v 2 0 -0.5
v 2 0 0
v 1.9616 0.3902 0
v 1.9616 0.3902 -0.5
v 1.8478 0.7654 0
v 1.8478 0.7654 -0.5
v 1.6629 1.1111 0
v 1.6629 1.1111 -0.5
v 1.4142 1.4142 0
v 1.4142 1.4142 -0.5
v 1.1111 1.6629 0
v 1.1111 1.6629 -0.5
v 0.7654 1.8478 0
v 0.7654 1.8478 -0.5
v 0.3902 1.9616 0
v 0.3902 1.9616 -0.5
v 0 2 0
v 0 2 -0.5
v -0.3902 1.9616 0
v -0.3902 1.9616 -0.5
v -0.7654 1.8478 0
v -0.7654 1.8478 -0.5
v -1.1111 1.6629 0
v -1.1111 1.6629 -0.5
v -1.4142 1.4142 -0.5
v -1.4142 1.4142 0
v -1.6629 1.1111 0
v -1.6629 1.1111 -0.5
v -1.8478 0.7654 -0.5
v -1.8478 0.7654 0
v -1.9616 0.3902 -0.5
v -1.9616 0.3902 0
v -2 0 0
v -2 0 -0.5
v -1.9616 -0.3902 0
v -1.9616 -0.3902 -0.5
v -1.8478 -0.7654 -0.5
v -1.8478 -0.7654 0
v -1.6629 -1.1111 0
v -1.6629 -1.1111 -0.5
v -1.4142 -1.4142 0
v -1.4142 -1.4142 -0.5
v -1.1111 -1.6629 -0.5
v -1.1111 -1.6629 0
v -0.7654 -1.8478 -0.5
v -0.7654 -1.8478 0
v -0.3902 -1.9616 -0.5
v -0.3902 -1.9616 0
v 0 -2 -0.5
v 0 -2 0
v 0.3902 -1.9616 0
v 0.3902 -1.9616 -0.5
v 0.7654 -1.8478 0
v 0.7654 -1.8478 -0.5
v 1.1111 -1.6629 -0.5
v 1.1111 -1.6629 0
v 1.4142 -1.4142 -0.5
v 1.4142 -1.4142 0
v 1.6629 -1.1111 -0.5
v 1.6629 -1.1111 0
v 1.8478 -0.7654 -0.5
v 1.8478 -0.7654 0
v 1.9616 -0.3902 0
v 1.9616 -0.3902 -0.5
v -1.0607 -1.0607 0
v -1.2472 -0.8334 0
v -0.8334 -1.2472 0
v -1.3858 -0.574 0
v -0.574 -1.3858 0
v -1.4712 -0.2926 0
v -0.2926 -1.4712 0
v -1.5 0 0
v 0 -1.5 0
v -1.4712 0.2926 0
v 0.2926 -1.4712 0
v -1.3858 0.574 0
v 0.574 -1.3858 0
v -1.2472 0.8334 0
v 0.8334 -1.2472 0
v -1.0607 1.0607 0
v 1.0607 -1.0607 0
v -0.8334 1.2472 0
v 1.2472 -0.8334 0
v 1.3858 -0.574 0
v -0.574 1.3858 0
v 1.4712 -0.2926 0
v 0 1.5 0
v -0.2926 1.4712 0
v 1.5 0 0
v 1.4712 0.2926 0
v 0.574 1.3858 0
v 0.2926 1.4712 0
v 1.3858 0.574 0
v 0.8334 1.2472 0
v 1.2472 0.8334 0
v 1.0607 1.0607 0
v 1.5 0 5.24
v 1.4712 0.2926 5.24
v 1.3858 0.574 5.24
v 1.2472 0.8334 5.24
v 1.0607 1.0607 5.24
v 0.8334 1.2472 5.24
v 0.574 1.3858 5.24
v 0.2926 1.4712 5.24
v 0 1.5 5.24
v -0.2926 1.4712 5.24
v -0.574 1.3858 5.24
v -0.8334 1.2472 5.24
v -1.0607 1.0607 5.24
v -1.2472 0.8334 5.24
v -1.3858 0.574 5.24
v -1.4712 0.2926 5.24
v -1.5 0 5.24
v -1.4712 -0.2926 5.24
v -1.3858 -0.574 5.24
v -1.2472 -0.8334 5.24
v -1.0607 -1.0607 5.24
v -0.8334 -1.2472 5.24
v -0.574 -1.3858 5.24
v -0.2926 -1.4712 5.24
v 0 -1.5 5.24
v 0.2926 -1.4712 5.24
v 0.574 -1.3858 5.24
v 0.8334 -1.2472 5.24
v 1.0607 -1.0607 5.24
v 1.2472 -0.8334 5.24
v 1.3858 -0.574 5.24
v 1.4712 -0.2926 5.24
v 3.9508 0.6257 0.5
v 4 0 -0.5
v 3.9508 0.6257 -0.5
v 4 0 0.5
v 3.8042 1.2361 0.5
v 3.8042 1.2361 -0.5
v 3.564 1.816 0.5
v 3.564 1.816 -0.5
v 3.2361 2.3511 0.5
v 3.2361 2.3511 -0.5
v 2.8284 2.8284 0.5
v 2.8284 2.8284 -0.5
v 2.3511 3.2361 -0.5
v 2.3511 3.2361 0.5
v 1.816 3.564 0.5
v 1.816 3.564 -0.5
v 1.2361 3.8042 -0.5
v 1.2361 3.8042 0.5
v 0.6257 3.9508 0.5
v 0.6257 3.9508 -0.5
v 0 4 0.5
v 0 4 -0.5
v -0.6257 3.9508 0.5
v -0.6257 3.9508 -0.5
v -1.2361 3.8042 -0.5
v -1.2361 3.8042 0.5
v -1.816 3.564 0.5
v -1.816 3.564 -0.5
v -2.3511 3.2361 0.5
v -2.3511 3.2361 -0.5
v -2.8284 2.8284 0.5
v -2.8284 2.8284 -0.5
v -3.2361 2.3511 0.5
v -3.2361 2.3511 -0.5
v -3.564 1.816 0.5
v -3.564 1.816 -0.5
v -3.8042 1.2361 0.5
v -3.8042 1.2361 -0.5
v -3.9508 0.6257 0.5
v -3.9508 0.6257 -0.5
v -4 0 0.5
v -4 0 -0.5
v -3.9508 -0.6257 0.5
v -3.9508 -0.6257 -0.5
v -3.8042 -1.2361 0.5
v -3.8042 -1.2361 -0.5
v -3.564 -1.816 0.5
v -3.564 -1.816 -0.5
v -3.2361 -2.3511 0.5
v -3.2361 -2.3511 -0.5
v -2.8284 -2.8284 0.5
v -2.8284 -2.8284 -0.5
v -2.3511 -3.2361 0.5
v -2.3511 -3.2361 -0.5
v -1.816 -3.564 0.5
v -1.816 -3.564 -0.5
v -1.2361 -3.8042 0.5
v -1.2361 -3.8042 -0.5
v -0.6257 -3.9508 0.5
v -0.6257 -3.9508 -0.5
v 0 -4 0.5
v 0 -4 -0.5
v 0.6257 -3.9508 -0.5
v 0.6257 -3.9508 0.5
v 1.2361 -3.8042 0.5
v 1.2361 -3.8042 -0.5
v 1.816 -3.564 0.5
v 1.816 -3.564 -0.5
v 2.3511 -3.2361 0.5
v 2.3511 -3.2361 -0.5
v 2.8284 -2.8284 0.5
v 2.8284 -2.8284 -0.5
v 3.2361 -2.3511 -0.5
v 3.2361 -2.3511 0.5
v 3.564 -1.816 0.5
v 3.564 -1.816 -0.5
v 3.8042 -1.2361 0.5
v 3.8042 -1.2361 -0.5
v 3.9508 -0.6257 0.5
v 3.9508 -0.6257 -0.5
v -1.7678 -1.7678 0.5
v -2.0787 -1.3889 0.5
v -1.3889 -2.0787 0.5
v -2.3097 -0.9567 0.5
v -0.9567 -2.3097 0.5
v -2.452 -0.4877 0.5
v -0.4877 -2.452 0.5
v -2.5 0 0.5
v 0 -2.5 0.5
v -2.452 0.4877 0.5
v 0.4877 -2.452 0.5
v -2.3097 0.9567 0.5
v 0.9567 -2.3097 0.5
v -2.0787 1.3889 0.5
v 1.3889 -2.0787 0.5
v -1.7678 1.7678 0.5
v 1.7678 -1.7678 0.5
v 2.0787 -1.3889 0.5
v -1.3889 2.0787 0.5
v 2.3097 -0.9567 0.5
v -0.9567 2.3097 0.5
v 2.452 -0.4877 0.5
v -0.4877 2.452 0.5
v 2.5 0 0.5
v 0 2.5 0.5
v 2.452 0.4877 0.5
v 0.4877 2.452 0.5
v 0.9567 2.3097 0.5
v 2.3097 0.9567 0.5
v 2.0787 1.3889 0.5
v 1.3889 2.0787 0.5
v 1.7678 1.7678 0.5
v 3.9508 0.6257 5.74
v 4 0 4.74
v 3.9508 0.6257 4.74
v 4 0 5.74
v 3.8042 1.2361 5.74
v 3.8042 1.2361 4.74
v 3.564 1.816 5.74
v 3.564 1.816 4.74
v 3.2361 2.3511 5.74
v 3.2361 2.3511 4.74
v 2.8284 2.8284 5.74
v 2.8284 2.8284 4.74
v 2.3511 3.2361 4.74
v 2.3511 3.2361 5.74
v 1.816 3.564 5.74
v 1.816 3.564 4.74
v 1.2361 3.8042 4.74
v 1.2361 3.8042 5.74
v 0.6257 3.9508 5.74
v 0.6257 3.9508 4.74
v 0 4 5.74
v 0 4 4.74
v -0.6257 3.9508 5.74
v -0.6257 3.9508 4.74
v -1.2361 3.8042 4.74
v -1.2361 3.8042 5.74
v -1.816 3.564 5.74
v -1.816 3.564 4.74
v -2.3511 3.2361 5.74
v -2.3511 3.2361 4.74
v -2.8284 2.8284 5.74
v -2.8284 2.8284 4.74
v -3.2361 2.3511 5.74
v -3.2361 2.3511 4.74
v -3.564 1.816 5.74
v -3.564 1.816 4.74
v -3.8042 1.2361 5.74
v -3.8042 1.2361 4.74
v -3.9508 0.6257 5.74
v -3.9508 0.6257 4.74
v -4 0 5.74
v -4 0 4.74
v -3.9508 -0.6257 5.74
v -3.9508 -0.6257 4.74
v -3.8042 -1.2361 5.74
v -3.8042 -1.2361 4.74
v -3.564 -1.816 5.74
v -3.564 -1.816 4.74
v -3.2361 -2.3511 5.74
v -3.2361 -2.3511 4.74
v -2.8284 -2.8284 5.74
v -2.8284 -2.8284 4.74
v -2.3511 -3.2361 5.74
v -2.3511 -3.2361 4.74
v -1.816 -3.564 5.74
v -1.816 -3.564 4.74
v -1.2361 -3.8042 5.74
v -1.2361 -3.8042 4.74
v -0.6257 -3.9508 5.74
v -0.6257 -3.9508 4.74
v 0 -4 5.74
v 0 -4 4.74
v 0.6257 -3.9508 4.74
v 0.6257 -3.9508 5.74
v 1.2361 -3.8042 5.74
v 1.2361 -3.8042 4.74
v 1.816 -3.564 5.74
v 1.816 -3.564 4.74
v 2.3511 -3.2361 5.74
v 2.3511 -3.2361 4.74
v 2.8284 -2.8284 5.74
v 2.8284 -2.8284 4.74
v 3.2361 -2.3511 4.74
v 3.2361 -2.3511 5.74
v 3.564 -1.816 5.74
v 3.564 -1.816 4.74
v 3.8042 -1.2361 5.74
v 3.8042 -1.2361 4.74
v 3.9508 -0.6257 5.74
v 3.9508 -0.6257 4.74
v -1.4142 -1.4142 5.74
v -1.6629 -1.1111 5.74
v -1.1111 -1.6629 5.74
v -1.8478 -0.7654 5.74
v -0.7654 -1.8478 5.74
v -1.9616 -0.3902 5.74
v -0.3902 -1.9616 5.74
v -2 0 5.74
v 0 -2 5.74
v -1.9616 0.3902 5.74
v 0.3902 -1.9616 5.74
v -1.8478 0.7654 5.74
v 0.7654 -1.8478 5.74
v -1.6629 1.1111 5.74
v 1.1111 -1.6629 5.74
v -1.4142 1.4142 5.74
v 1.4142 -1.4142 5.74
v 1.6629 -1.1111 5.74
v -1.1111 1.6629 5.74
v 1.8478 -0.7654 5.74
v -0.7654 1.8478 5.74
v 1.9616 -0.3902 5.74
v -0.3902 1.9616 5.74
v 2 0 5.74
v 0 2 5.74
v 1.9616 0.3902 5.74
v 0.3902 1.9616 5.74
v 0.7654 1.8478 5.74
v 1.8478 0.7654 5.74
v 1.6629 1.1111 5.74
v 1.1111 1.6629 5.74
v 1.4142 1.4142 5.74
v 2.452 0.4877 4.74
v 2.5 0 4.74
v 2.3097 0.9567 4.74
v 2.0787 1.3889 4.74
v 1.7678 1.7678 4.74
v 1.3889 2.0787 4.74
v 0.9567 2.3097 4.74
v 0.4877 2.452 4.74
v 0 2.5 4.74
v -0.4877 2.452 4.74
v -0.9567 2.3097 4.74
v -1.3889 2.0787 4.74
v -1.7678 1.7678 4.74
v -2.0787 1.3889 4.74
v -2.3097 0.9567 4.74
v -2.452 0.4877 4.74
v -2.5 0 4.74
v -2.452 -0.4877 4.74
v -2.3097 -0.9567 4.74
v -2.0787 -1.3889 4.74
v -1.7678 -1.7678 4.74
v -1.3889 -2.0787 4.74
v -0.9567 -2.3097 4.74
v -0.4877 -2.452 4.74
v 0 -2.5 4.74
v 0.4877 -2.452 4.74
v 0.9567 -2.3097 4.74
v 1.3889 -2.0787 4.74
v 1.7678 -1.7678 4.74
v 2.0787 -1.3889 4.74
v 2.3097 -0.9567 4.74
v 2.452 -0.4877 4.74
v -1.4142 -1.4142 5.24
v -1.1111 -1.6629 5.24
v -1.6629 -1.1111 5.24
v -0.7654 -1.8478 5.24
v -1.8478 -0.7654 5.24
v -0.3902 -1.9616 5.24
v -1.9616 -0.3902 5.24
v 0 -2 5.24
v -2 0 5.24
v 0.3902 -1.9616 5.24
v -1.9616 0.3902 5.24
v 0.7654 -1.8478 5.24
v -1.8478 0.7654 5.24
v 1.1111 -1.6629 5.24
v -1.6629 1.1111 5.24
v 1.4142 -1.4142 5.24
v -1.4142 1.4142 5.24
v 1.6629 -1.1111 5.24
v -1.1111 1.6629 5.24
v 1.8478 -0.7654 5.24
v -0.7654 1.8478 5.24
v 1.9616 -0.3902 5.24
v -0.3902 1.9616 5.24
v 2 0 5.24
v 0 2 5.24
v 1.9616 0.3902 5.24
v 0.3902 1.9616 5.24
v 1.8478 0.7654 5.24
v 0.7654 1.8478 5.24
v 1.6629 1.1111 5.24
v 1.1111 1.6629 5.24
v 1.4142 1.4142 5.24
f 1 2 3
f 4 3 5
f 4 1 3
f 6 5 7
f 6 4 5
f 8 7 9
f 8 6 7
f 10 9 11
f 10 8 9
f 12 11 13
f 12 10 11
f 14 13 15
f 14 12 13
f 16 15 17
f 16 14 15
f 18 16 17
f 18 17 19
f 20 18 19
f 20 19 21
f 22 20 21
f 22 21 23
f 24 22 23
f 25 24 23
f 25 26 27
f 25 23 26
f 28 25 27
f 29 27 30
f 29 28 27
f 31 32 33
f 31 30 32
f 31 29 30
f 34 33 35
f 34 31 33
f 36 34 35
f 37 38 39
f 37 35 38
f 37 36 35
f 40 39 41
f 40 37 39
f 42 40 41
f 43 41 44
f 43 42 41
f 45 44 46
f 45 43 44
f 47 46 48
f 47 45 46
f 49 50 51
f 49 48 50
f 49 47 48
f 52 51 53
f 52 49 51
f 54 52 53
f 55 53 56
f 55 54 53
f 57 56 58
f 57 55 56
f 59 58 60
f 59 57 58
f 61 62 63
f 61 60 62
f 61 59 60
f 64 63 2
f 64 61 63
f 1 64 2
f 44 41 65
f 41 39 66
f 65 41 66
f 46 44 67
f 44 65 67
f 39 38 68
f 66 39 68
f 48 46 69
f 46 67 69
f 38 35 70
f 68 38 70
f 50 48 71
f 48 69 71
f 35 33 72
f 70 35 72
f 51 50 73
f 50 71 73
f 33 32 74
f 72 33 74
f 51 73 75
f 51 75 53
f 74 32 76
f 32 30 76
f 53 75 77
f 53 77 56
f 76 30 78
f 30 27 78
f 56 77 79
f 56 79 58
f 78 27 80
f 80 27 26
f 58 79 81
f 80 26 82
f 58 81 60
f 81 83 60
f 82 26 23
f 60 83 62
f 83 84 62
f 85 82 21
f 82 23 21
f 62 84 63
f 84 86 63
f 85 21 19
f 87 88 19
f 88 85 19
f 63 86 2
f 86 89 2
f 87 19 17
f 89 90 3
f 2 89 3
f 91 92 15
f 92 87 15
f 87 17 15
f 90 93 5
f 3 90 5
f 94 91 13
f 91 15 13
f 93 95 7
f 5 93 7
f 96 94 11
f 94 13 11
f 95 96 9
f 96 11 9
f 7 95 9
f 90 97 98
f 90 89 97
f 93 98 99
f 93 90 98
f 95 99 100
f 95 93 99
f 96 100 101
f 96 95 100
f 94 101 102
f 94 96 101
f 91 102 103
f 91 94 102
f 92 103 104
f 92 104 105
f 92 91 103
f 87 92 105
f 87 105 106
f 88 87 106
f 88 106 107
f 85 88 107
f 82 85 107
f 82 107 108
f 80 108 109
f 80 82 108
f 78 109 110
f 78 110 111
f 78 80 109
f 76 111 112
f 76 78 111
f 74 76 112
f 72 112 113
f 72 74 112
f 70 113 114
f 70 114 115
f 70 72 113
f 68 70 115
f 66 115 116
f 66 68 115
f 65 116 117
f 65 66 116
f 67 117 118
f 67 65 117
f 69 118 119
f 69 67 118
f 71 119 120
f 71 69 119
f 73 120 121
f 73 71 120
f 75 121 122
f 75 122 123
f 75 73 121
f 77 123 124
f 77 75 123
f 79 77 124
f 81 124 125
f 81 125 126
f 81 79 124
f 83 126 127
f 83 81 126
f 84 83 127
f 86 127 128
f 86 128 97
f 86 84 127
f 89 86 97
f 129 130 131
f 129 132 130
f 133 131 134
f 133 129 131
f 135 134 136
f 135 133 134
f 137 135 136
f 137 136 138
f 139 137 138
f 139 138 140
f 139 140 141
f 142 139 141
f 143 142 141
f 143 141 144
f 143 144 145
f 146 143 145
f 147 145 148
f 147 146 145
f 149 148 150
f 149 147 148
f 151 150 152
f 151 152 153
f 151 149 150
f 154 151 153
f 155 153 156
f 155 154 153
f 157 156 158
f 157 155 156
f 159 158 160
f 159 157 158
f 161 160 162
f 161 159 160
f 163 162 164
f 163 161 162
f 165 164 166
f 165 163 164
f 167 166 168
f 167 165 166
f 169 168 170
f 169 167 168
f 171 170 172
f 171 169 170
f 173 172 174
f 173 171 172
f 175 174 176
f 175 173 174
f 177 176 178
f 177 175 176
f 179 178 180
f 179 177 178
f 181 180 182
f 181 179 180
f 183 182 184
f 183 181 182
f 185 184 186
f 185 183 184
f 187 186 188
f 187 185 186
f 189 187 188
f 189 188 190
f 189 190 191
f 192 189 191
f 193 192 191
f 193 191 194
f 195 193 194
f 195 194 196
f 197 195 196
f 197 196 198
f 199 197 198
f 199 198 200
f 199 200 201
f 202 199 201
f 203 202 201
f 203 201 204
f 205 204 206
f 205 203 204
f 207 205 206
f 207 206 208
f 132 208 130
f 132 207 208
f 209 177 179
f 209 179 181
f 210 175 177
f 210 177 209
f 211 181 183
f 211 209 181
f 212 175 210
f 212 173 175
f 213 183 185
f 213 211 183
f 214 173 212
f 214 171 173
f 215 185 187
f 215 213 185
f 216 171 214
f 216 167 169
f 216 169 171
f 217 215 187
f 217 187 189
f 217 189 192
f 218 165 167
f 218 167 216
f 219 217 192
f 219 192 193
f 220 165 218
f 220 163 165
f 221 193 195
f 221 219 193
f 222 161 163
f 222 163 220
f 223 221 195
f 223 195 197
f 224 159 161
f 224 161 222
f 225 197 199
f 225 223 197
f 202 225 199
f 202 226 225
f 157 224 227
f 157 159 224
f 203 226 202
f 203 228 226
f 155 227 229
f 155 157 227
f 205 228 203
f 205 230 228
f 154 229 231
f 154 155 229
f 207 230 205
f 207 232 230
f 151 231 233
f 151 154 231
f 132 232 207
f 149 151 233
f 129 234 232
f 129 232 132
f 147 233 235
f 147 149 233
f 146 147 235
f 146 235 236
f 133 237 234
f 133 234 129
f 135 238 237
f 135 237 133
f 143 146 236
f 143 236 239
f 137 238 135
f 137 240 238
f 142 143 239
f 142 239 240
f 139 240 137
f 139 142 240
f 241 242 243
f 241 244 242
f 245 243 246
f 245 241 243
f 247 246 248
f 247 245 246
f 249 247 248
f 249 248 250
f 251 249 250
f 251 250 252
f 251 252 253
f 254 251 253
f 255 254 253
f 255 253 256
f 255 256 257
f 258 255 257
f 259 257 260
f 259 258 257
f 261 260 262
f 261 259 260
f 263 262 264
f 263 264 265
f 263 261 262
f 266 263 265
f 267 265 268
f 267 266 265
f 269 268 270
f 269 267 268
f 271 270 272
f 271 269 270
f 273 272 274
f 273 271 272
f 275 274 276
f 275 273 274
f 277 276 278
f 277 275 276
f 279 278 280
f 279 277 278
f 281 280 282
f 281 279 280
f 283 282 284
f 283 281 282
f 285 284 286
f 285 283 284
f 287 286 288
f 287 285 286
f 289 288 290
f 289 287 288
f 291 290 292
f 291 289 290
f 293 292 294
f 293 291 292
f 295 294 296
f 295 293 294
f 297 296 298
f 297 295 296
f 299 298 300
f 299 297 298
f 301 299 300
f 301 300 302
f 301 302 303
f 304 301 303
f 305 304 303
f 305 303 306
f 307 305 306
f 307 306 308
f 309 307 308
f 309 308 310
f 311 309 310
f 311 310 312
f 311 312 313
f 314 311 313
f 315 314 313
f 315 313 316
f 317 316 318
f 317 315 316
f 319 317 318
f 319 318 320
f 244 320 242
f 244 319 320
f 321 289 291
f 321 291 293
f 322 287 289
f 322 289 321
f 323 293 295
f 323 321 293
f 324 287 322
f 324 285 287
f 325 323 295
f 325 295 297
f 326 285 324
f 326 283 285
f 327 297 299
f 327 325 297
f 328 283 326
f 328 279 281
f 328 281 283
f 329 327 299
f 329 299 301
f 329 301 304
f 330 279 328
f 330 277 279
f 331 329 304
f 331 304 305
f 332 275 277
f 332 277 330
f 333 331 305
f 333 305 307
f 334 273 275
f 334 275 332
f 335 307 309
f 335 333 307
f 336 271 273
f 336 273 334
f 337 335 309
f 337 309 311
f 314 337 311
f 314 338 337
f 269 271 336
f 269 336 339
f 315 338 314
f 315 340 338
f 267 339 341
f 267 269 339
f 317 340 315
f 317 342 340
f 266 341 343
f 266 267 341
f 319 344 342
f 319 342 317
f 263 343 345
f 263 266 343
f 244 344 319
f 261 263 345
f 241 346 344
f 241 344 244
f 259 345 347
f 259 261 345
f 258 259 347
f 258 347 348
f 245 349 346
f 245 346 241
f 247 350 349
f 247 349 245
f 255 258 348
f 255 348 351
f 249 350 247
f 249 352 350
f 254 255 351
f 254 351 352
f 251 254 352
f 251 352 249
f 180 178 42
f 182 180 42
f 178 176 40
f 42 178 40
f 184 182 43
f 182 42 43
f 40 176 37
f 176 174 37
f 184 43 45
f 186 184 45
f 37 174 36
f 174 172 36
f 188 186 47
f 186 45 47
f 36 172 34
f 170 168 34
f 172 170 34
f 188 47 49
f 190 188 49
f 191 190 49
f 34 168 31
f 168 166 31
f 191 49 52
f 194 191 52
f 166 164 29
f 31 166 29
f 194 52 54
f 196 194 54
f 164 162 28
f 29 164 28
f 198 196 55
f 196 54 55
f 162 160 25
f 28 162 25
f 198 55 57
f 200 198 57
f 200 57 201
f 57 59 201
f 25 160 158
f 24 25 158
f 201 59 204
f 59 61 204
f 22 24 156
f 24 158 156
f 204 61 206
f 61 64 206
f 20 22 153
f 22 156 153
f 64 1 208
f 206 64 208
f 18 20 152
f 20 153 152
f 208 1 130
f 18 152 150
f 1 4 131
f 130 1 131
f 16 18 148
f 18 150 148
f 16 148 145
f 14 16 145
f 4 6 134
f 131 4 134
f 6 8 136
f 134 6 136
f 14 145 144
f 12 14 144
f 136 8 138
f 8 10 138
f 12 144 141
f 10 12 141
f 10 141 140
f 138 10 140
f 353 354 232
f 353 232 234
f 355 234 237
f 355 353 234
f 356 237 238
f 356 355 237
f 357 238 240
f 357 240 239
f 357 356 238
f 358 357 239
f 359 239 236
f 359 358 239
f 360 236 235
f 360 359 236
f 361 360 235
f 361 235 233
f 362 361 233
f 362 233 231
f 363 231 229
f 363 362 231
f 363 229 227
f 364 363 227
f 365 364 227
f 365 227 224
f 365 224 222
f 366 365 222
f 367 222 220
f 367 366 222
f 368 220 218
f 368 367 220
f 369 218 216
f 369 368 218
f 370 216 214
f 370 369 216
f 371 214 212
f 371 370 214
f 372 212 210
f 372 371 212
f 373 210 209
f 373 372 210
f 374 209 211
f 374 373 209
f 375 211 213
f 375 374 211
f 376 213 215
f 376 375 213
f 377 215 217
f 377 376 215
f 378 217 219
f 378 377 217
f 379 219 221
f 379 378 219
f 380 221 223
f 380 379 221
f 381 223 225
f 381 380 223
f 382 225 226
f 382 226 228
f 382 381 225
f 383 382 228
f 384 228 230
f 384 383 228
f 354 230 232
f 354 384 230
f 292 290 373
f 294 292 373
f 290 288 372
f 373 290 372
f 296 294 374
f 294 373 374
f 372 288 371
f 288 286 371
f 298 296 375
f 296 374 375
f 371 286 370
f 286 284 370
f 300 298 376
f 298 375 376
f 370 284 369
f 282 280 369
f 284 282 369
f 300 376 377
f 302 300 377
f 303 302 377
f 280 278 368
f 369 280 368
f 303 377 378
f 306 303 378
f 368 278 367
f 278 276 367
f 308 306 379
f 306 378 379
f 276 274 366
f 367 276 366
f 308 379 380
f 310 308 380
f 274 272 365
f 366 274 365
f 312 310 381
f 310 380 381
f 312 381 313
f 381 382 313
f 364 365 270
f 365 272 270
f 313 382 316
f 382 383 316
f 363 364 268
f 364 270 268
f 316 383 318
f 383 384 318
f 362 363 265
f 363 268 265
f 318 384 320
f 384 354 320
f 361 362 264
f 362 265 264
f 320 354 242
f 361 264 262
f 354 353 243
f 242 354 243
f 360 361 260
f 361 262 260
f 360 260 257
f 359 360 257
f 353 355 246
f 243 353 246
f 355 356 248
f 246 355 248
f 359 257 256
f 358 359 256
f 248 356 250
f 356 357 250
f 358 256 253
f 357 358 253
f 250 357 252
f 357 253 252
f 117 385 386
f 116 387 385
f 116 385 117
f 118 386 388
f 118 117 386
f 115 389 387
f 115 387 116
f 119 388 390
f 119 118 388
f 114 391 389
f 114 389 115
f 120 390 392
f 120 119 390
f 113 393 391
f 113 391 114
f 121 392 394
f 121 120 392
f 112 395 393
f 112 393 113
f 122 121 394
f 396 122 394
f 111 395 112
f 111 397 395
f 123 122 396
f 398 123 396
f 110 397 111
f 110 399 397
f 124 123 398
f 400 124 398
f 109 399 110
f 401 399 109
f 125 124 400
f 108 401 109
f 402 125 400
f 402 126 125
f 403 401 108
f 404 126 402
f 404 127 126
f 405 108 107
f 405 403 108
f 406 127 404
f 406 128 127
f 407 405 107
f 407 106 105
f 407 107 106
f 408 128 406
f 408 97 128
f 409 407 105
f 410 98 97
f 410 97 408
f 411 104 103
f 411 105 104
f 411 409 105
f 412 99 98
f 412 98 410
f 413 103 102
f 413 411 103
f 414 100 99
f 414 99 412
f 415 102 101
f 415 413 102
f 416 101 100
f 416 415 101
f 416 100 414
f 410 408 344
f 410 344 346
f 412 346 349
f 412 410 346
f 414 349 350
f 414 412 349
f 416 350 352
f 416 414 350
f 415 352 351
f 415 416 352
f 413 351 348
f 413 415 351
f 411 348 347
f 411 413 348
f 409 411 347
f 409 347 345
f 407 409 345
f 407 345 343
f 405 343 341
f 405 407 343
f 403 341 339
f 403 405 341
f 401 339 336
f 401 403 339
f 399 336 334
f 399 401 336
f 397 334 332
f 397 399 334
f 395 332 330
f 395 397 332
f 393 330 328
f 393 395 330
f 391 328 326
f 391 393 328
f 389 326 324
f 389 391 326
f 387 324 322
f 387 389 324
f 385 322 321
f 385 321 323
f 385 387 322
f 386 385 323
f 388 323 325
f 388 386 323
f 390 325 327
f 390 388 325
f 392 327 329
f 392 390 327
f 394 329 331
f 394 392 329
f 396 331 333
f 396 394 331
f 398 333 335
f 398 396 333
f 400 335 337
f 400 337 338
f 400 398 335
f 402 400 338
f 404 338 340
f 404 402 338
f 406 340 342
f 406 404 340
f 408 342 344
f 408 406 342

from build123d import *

# Parameters (mm, degrees)
F0_R     = 4
F0_R_2   = 2
F5_DEPTH = 0.5
F2_R     = 2.5
F2_R_2   = 1.5
F6_DEPTH = 2.62
F4_R     = 4
F4_R_2   = 2
F7_DEPTH = 0.5


with BuildPart() as f5:
    # F0 (on Top) → F5 (new body, symmetric)
    with BuildSketch(Plane.XY):
        Circle(F0_R)
        Circle(F0_R_2, mode=Mode.SUBTRACT)
    extrude(amount=F5_DEPTH, both=True)

    # F2 (on offset) → F6 (join, symmetric)
    with BuildSketch(Plane.XY.offset(2.62)):
        Circle(F2_R)
        Circle(F2_R_2, mode=Mode.SUBTRACT)
    extrude(amount=F6_DEPTH, both=True)

    # F4 (on offset) → F7 (join, symmetric)
    with BuildSketch(Plane.XY.offset(5.24)):
        Circle(F4_R)
        Circle(F4_R_2, mode=Mode.SUBTRACT)
    extrude(amount=F7_DEPTH, both=True)


solid = f5.part
